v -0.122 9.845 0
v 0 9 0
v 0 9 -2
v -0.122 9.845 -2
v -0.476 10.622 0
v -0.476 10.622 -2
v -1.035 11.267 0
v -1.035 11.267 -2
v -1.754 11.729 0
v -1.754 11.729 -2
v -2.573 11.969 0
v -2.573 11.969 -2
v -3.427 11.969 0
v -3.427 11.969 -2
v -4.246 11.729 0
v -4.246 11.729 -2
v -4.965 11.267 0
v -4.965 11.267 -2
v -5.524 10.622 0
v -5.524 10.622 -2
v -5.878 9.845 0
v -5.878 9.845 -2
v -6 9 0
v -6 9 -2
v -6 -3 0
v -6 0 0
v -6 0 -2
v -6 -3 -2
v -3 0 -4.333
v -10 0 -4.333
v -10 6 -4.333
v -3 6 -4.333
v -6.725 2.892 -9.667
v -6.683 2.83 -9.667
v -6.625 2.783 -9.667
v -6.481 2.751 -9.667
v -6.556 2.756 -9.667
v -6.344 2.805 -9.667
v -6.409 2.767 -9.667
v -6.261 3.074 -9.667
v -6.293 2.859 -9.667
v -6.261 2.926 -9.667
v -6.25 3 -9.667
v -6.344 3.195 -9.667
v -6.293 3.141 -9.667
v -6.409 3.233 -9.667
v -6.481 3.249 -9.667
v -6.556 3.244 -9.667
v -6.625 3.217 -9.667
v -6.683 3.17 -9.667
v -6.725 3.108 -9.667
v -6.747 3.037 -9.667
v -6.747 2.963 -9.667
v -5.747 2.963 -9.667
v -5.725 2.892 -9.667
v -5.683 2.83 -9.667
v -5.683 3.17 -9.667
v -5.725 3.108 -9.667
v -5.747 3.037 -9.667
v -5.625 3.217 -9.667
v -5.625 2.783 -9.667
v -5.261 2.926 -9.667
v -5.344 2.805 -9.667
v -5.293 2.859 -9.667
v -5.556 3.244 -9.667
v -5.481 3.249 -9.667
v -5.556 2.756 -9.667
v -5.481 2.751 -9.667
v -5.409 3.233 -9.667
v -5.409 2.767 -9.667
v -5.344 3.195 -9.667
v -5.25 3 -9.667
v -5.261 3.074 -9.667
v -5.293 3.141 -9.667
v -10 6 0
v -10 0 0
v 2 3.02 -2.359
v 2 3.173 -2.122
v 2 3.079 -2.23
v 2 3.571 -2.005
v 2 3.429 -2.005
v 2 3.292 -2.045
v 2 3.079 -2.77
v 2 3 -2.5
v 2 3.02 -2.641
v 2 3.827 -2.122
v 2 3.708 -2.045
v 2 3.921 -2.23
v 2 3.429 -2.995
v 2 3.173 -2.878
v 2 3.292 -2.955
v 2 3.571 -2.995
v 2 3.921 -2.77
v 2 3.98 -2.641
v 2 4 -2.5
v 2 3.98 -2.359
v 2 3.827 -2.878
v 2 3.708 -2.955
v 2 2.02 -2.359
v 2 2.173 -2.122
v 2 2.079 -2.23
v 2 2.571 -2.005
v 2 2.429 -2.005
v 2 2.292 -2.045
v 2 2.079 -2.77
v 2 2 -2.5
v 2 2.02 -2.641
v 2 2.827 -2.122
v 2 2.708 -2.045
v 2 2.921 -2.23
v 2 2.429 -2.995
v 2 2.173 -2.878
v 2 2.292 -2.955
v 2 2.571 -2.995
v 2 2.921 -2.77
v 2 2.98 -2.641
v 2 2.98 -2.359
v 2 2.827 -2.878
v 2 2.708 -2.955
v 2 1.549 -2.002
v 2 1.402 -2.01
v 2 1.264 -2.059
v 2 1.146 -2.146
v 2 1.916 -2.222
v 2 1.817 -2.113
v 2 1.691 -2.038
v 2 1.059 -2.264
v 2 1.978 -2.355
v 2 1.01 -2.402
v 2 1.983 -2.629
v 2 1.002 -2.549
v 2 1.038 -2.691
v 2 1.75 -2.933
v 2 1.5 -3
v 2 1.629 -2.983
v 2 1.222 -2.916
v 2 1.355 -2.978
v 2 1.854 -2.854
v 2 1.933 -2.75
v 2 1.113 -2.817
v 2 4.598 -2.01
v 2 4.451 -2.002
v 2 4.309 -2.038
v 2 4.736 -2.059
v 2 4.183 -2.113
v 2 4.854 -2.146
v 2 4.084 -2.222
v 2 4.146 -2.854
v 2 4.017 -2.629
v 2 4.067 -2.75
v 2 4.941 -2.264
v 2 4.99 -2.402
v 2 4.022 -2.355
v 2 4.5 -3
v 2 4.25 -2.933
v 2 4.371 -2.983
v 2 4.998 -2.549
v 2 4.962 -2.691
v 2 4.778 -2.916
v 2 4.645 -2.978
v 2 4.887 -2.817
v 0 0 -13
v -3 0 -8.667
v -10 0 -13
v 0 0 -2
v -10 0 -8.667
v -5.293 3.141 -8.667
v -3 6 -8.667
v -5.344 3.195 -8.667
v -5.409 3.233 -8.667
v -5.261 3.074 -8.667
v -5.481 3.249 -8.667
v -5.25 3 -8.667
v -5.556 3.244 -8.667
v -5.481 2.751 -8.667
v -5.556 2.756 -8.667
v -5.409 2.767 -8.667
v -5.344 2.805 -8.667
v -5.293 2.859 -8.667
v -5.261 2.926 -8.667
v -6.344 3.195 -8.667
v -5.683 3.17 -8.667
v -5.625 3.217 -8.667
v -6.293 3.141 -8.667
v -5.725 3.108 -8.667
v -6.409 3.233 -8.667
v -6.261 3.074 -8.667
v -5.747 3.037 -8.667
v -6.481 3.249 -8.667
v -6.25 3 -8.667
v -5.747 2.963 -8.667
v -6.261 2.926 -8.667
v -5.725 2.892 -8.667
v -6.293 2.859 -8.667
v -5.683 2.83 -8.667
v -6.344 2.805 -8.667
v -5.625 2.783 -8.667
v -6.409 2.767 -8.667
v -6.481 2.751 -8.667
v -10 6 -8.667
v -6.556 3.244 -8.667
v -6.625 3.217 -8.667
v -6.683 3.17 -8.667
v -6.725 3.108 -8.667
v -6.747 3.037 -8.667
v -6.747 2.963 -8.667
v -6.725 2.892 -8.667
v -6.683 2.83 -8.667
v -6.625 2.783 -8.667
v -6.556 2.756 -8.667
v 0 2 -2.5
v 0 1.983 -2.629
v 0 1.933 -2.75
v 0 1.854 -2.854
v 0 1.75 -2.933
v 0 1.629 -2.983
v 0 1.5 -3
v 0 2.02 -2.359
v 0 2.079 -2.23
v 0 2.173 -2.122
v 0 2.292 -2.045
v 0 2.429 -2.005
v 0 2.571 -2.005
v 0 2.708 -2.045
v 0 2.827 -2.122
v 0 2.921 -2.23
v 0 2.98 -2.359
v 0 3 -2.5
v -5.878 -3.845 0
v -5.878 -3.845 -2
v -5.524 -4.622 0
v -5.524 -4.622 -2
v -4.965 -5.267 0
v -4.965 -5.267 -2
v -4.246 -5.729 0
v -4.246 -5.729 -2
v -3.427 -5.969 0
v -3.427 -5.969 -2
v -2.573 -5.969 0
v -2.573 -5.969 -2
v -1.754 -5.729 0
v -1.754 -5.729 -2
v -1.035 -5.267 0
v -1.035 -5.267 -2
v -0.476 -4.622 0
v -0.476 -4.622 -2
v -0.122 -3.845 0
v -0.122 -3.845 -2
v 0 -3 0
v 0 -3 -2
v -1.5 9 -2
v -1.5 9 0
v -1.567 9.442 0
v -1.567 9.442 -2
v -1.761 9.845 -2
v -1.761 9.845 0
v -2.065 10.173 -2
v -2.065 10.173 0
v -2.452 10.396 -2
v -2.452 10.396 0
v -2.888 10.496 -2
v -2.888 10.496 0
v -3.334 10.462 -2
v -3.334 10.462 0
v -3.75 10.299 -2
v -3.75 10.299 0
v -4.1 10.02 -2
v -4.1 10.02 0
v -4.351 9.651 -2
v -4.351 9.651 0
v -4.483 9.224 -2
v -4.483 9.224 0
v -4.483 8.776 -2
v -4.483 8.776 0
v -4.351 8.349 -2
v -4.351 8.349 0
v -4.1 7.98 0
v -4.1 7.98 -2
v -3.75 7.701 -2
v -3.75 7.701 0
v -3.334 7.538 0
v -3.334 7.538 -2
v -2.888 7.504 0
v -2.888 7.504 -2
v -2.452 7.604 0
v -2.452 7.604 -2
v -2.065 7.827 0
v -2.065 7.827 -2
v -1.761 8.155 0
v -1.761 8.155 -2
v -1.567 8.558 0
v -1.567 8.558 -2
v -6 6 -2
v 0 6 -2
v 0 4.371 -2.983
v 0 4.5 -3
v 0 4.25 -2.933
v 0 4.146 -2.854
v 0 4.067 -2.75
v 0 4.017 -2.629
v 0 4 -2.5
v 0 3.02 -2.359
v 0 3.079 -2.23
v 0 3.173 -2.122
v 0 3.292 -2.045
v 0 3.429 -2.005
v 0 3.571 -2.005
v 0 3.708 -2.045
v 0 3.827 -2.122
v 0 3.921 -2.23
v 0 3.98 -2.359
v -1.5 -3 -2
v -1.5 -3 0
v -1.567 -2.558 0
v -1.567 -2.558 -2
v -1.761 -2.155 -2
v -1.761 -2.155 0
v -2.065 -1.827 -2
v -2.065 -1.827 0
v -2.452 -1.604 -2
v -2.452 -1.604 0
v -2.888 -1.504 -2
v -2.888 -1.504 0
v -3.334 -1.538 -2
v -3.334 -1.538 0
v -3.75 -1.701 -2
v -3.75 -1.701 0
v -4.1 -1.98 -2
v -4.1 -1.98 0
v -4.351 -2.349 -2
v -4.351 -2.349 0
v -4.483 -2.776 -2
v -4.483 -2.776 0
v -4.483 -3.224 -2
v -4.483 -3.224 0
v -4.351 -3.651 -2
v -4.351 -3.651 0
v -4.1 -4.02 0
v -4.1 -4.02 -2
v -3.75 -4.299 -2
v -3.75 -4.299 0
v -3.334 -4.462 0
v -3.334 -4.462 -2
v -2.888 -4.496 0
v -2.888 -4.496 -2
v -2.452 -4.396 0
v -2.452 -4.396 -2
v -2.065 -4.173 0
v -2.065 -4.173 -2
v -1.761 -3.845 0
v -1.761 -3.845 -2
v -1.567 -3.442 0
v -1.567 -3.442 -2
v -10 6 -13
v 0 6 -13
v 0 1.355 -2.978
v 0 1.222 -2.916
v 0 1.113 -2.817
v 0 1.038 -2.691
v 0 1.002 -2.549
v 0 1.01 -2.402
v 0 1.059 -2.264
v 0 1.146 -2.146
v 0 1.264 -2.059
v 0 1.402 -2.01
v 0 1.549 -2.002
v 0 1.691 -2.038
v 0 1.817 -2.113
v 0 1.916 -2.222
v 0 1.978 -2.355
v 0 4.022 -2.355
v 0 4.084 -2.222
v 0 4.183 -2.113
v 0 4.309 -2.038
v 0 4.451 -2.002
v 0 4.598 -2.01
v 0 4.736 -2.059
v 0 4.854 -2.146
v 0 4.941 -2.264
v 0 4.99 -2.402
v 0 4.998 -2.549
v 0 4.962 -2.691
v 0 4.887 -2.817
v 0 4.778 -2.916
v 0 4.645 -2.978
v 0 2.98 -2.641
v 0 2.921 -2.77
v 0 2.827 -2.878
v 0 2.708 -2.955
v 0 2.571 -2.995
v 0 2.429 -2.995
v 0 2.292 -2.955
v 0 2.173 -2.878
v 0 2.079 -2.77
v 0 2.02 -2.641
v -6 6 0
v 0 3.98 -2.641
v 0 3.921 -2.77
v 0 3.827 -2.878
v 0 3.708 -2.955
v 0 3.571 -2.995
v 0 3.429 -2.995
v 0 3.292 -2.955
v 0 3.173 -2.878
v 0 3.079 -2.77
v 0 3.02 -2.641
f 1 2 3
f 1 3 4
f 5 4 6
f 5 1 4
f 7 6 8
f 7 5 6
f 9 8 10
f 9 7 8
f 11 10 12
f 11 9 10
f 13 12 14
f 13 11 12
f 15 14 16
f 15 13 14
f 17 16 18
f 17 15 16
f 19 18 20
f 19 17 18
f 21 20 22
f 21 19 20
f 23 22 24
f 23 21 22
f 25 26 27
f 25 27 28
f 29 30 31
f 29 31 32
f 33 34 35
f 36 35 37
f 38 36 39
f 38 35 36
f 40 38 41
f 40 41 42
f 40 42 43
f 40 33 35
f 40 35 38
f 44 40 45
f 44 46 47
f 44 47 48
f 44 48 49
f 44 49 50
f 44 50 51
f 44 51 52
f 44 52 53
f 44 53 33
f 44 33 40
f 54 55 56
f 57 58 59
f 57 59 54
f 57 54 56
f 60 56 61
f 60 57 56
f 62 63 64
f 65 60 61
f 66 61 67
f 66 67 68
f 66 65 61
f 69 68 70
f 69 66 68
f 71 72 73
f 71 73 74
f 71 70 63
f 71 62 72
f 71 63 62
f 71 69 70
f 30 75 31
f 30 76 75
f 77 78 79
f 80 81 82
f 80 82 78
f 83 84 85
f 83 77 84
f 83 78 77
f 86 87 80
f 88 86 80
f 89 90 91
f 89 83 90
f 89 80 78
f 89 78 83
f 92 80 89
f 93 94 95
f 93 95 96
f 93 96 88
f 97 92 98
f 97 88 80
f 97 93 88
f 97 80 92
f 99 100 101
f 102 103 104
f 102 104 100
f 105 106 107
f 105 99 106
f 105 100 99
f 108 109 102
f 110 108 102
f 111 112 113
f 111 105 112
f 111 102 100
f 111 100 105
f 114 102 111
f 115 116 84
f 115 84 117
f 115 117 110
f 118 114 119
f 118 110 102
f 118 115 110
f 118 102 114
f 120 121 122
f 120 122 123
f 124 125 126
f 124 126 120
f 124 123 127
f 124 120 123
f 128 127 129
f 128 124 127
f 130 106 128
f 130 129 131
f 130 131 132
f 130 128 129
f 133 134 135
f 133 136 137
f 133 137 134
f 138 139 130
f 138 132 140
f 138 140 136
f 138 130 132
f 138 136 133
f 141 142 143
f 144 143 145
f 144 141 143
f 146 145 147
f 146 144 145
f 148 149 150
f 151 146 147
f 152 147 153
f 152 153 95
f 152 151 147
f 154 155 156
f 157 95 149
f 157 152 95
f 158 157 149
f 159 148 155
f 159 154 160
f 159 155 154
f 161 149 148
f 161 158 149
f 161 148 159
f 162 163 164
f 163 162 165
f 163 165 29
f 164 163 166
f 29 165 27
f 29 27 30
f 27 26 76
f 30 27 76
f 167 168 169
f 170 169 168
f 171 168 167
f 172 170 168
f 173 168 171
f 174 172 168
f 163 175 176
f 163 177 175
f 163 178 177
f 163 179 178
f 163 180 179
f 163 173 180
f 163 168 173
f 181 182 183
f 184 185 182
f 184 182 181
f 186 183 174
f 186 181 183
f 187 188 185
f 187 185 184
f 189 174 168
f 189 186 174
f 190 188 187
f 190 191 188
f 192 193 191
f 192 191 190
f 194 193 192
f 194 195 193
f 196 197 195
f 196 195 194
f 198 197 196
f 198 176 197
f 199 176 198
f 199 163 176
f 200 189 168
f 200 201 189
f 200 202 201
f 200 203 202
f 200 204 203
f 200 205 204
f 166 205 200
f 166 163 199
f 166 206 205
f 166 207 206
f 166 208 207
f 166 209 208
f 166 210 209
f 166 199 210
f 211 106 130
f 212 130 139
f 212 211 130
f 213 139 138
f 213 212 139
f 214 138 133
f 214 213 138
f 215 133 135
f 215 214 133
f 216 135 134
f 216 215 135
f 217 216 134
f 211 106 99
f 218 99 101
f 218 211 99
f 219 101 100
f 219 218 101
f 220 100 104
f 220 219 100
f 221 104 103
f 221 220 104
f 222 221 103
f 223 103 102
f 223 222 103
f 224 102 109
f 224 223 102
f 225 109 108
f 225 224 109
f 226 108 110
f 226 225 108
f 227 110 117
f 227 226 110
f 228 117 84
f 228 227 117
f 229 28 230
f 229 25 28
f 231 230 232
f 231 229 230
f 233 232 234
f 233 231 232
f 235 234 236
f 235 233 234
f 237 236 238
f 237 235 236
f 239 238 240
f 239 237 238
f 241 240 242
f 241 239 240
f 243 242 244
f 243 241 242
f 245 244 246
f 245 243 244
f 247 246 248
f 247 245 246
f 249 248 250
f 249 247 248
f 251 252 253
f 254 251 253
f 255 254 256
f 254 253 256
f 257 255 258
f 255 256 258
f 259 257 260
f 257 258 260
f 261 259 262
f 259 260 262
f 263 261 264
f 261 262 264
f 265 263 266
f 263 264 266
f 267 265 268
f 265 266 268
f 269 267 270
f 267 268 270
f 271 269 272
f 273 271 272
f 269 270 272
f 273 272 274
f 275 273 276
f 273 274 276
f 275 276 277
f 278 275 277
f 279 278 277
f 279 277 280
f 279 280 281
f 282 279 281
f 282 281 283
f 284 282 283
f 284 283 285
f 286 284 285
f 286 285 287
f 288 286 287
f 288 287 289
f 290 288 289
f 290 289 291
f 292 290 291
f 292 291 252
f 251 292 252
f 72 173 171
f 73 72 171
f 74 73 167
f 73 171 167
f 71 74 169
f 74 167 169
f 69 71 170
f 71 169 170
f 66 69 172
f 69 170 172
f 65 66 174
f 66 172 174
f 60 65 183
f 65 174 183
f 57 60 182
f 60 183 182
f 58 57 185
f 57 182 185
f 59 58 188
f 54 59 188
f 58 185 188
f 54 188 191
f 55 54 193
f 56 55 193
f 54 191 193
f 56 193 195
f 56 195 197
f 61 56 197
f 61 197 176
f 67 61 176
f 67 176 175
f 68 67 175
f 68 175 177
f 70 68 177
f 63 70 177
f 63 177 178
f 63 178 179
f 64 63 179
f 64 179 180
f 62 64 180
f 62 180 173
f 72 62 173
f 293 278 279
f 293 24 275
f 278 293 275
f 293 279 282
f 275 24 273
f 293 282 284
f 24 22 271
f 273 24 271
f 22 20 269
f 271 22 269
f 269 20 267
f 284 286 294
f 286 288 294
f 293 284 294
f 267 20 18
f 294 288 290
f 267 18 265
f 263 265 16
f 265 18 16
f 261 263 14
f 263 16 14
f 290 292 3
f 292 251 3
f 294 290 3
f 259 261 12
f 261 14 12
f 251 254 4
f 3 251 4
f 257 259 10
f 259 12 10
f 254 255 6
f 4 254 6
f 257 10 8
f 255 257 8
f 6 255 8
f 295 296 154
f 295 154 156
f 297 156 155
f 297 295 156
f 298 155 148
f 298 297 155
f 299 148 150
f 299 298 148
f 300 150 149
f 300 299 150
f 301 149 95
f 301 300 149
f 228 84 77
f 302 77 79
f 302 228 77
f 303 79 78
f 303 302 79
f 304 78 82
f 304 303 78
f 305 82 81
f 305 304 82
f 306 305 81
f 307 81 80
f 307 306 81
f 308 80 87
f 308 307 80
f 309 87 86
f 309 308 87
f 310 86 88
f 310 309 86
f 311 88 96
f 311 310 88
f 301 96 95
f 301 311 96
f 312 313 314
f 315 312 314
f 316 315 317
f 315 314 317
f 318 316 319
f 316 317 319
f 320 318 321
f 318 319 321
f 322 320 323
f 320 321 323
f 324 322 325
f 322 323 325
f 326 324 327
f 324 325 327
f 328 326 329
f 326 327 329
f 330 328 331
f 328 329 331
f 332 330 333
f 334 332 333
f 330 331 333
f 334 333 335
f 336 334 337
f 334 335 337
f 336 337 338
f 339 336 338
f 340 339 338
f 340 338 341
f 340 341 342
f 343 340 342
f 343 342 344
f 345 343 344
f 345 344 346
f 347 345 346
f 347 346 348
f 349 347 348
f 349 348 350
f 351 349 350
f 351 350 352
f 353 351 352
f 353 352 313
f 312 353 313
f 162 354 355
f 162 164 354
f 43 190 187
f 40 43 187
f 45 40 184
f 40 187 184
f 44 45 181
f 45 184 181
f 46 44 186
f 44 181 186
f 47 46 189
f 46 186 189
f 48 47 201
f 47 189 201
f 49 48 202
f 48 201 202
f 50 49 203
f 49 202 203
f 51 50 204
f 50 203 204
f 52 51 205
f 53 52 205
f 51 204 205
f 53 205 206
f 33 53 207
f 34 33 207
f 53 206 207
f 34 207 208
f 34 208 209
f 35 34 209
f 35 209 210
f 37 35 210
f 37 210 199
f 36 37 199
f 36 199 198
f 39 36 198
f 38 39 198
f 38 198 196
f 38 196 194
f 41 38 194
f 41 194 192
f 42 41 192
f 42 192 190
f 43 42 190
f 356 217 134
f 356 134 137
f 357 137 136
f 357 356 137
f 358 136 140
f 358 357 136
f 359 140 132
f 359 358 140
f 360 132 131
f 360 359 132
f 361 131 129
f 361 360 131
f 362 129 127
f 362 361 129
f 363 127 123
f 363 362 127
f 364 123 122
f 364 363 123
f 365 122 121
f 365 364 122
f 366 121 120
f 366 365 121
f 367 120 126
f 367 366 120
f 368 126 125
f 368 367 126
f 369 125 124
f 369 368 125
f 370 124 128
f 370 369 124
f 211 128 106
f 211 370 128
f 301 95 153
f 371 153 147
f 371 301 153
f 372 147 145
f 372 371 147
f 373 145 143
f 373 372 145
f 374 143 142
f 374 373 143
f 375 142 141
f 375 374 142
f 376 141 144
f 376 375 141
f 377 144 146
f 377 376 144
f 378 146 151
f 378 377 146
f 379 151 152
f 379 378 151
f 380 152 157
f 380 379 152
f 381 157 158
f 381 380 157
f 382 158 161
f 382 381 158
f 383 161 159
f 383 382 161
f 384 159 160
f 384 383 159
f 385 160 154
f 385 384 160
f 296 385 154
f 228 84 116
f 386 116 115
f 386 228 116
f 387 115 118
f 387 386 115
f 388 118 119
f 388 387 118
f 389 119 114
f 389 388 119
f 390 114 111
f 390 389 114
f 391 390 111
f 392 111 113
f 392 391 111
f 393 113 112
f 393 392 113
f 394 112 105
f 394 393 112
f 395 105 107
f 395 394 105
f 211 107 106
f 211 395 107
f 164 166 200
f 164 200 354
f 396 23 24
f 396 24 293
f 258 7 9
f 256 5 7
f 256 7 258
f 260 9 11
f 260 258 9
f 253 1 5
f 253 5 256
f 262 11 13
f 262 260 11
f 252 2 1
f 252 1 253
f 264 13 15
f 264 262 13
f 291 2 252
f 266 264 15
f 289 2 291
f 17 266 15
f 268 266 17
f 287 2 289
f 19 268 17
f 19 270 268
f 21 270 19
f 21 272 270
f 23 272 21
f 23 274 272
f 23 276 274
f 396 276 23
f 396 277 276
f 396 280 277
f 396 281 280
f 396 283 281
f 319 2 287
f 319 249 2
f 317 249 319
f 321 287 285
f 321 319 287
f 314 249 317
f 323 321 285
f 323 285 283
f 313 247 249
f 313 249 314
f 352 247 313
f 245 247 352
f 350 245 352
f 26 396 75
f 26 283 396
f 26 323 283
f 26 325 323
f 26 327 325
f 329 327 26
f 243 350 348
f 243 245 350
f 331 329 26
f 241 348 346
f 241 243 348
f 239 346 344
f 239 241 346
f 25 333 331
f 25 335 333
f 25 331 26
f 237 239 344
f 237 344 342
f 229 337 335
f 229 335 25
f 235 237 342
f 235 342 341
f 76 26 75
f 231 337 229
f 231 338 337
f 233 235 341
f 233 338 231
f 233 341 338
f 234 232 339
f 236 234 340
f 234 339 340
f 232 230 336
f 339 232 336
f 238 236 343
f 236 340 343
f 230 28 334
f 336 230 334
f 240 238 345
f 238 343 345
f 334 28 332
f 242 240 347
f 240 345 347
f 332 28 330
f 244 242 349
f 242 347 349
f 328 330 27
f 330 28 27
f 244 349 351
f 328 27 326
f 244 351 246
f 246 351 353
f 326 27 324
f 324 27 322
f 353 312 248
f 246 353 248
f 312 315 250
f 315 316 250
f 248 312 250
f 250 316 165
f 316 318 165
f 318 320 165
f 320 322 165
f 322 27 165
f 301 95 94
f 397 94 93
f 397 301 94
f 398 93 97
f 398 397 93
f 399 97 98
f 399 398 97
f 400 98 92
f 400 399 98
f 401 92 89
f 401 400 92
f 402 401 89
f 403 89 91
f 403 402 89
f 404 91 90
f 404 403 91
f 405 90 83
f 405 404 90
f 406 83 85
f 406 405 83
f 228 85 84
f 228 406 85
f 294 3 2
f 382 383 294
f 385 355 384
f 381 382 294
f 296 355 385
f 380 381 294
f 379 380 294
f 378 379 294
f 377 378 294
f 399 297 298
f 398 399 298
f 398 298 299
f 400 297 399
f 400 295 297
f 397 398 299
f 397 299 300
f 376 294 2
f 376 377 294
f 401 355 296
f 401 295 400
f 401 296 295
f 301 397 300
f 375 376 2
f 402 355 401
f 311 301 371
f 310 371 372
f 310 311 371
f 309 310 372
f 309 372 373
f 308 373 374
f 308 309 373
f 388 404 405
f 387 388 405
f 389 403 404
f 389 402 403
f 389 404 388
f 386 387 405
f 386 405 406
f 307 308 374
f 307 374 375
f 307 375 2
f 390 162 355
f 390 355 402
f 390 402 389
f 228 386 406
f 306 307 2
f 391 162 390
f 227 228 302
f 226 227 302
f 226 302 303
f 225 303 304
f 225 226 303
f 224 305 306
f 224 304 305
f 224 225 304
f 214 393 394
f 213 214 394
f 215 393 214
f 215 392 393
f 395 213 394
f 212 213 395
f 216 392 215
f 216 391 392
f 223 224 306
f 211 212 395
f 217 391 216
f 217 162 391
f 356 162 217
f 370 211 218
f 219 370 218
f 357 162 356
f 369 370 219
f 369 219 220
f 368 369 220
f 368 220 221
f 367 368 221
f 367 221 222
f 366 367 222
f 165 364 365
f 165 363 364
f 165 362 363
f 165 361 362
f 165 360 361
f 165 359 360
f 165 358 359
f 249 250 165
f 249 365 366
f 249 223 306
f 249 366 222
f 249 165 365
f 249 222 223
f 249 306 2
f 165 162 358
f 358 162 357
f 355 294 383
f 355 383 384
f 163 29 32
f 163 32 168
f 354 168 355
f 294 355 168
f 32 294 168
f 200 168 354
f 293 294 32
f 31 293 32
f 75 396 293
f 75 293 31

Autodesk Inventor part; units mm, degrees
ref_plane "YZ Plane" through (0, 0, 0) normal (1, 0, 0) x (0, 1, 0)
ref_plane "XZ Plane" through (0, 0, 0) normal (0, 1, 0) x (-1, 0, 0)
ref_plane "XY Plane" through (0, 0, 0) normal (0, 0, 1) x (1, 0, 0)
sketch "Sketch2" plane through (0, 0, 0) normal (0, 1, 0) x (-1, 0, 0)
  line L0 (0, 0) -> (10, 0)
  line L1 (10, 0) -> (10, -13)
  line L2 (10, -13) -> (0, -13)
  line L3 (0, -13) -> (0, 0)
  line L4 (10, -4.3333) -> (3, -4.3333)
  line L5 (3, -4.3333) -> (3, -8.6667)
  line L6 (3, -8.6667) -> (10, -8.6667)
  line L7 (10, -8.6667) -> (10, -4.3333)
  dimension "d4" = 13
  dimension "d5" = 10
  dimension "d6" = 4.3333
  dimension "d7" = 7
  dimension "d8" = 4.3333
extrude "Extrusion2" add sketch "Sketch2" along normal blind 6 contours L0 L1 L4 L5 L6 L2 L3
sketch "Sketch3" plane through (-10, 0, 0) normal (0, 0, 1) x (1, 0, 0)
  line L0 (7, 9) -> (7, -3) construction
  line L1 (4, 9) -> (4, -3)
  line L2 (10, -3) -> (10, 9)
  arc A0 (10, 9) -> (4, 9) centre (7, 9) ccw
  arc A1 (4, -3) -> (10, -3) centre (7, -3) ccw
  circle A2 centre (7, 9) radius 1.5
  circle A3 centre (7, -3) radius 1.5
  line L3 (10, 0) -> (10, 6) projected
  line L4 (0, 6) -> (10, 6) projected
  line L5 (0, 0) -> (10, 0) projected
  point P0 (7, 3)
  dimension "d11" = 12
  dimension "d12" = 6
  dimension "d13" = 3
  dimension "d14" = 3
  dimension "d15" = 3
  dimension "d16" = 6
extrude "Extrusion3" add sketch "Sketch3" against normal blind 2
sketch "Sketch4" plane through (0, 0, -13) normal (1, 0, 0) x (0, 0, -1)
  circle A0 centre (-10.5, 4.5) radius 0.5
  line L0 (-8.6667, 0) -> (-8.6667, 6) projected
  line L1 (-8.6667, 5.6316) -> (-8.6667, 4.1699)
  circle A1 centre (-10.5, 3.5) radius 0.5
  circle A2 centre (-10.5, 2.5) radius 0.5
  circle A3 centre (-10.5, 1.5) radius 0.5
  line L2 (-11, 6) -> (0, 6) projected
  line L3 (-11, 0) -> (0, 0) projected
  line L4 (-11, 0) -> (-11, -3) projected
  point P0 (-13, 0)
  dimension "d19" = 1
  dimension "d22" = 1
  dimension "d27" = 1.5
  dimension "d28" = 3
  dimension "d29" = 6
  dimension "d30" = 0.5
extrude "Extrusion4" add sketch "Sketch4" along normal blind 2
sketch "Sketch5" plane through (-10, 0, -8.6667) normal (0, 0, 1) x (1, 0, 0)
  circle A0 centre (3.5, 3) radius 0.25
  circle A1 centre (4.5, 3) radius 0.25
  line L0 (7, 0) -> (7, 6) projected
  line L1 (0, 6) -> (7, 6) projected
  point P0 (10, 0)
  dimension "d33" = 0.5
  dimension "d34" = 0.5
  dimension "d35" = 1
  dimension "d36" = 2.5
  dimension "d37" = 3
extrude "Extrusion5" cut sketch "Sketch5" against normal blind 1
equation "\"d6\" = 0.333333 * d4"
equation "\"d8\" = 0.333333 * d4"
equation "\"d14\" = d13"
equation "\"d15\" = 0.5 * d16"
equation "\"d27\" = -0.5 * d28 + 0.5 * d29"
equation "\"d37\" = 0.5 * d16"
properties part number "InkrementalisOptikaiErzekelo" material "UHMW, Black"
